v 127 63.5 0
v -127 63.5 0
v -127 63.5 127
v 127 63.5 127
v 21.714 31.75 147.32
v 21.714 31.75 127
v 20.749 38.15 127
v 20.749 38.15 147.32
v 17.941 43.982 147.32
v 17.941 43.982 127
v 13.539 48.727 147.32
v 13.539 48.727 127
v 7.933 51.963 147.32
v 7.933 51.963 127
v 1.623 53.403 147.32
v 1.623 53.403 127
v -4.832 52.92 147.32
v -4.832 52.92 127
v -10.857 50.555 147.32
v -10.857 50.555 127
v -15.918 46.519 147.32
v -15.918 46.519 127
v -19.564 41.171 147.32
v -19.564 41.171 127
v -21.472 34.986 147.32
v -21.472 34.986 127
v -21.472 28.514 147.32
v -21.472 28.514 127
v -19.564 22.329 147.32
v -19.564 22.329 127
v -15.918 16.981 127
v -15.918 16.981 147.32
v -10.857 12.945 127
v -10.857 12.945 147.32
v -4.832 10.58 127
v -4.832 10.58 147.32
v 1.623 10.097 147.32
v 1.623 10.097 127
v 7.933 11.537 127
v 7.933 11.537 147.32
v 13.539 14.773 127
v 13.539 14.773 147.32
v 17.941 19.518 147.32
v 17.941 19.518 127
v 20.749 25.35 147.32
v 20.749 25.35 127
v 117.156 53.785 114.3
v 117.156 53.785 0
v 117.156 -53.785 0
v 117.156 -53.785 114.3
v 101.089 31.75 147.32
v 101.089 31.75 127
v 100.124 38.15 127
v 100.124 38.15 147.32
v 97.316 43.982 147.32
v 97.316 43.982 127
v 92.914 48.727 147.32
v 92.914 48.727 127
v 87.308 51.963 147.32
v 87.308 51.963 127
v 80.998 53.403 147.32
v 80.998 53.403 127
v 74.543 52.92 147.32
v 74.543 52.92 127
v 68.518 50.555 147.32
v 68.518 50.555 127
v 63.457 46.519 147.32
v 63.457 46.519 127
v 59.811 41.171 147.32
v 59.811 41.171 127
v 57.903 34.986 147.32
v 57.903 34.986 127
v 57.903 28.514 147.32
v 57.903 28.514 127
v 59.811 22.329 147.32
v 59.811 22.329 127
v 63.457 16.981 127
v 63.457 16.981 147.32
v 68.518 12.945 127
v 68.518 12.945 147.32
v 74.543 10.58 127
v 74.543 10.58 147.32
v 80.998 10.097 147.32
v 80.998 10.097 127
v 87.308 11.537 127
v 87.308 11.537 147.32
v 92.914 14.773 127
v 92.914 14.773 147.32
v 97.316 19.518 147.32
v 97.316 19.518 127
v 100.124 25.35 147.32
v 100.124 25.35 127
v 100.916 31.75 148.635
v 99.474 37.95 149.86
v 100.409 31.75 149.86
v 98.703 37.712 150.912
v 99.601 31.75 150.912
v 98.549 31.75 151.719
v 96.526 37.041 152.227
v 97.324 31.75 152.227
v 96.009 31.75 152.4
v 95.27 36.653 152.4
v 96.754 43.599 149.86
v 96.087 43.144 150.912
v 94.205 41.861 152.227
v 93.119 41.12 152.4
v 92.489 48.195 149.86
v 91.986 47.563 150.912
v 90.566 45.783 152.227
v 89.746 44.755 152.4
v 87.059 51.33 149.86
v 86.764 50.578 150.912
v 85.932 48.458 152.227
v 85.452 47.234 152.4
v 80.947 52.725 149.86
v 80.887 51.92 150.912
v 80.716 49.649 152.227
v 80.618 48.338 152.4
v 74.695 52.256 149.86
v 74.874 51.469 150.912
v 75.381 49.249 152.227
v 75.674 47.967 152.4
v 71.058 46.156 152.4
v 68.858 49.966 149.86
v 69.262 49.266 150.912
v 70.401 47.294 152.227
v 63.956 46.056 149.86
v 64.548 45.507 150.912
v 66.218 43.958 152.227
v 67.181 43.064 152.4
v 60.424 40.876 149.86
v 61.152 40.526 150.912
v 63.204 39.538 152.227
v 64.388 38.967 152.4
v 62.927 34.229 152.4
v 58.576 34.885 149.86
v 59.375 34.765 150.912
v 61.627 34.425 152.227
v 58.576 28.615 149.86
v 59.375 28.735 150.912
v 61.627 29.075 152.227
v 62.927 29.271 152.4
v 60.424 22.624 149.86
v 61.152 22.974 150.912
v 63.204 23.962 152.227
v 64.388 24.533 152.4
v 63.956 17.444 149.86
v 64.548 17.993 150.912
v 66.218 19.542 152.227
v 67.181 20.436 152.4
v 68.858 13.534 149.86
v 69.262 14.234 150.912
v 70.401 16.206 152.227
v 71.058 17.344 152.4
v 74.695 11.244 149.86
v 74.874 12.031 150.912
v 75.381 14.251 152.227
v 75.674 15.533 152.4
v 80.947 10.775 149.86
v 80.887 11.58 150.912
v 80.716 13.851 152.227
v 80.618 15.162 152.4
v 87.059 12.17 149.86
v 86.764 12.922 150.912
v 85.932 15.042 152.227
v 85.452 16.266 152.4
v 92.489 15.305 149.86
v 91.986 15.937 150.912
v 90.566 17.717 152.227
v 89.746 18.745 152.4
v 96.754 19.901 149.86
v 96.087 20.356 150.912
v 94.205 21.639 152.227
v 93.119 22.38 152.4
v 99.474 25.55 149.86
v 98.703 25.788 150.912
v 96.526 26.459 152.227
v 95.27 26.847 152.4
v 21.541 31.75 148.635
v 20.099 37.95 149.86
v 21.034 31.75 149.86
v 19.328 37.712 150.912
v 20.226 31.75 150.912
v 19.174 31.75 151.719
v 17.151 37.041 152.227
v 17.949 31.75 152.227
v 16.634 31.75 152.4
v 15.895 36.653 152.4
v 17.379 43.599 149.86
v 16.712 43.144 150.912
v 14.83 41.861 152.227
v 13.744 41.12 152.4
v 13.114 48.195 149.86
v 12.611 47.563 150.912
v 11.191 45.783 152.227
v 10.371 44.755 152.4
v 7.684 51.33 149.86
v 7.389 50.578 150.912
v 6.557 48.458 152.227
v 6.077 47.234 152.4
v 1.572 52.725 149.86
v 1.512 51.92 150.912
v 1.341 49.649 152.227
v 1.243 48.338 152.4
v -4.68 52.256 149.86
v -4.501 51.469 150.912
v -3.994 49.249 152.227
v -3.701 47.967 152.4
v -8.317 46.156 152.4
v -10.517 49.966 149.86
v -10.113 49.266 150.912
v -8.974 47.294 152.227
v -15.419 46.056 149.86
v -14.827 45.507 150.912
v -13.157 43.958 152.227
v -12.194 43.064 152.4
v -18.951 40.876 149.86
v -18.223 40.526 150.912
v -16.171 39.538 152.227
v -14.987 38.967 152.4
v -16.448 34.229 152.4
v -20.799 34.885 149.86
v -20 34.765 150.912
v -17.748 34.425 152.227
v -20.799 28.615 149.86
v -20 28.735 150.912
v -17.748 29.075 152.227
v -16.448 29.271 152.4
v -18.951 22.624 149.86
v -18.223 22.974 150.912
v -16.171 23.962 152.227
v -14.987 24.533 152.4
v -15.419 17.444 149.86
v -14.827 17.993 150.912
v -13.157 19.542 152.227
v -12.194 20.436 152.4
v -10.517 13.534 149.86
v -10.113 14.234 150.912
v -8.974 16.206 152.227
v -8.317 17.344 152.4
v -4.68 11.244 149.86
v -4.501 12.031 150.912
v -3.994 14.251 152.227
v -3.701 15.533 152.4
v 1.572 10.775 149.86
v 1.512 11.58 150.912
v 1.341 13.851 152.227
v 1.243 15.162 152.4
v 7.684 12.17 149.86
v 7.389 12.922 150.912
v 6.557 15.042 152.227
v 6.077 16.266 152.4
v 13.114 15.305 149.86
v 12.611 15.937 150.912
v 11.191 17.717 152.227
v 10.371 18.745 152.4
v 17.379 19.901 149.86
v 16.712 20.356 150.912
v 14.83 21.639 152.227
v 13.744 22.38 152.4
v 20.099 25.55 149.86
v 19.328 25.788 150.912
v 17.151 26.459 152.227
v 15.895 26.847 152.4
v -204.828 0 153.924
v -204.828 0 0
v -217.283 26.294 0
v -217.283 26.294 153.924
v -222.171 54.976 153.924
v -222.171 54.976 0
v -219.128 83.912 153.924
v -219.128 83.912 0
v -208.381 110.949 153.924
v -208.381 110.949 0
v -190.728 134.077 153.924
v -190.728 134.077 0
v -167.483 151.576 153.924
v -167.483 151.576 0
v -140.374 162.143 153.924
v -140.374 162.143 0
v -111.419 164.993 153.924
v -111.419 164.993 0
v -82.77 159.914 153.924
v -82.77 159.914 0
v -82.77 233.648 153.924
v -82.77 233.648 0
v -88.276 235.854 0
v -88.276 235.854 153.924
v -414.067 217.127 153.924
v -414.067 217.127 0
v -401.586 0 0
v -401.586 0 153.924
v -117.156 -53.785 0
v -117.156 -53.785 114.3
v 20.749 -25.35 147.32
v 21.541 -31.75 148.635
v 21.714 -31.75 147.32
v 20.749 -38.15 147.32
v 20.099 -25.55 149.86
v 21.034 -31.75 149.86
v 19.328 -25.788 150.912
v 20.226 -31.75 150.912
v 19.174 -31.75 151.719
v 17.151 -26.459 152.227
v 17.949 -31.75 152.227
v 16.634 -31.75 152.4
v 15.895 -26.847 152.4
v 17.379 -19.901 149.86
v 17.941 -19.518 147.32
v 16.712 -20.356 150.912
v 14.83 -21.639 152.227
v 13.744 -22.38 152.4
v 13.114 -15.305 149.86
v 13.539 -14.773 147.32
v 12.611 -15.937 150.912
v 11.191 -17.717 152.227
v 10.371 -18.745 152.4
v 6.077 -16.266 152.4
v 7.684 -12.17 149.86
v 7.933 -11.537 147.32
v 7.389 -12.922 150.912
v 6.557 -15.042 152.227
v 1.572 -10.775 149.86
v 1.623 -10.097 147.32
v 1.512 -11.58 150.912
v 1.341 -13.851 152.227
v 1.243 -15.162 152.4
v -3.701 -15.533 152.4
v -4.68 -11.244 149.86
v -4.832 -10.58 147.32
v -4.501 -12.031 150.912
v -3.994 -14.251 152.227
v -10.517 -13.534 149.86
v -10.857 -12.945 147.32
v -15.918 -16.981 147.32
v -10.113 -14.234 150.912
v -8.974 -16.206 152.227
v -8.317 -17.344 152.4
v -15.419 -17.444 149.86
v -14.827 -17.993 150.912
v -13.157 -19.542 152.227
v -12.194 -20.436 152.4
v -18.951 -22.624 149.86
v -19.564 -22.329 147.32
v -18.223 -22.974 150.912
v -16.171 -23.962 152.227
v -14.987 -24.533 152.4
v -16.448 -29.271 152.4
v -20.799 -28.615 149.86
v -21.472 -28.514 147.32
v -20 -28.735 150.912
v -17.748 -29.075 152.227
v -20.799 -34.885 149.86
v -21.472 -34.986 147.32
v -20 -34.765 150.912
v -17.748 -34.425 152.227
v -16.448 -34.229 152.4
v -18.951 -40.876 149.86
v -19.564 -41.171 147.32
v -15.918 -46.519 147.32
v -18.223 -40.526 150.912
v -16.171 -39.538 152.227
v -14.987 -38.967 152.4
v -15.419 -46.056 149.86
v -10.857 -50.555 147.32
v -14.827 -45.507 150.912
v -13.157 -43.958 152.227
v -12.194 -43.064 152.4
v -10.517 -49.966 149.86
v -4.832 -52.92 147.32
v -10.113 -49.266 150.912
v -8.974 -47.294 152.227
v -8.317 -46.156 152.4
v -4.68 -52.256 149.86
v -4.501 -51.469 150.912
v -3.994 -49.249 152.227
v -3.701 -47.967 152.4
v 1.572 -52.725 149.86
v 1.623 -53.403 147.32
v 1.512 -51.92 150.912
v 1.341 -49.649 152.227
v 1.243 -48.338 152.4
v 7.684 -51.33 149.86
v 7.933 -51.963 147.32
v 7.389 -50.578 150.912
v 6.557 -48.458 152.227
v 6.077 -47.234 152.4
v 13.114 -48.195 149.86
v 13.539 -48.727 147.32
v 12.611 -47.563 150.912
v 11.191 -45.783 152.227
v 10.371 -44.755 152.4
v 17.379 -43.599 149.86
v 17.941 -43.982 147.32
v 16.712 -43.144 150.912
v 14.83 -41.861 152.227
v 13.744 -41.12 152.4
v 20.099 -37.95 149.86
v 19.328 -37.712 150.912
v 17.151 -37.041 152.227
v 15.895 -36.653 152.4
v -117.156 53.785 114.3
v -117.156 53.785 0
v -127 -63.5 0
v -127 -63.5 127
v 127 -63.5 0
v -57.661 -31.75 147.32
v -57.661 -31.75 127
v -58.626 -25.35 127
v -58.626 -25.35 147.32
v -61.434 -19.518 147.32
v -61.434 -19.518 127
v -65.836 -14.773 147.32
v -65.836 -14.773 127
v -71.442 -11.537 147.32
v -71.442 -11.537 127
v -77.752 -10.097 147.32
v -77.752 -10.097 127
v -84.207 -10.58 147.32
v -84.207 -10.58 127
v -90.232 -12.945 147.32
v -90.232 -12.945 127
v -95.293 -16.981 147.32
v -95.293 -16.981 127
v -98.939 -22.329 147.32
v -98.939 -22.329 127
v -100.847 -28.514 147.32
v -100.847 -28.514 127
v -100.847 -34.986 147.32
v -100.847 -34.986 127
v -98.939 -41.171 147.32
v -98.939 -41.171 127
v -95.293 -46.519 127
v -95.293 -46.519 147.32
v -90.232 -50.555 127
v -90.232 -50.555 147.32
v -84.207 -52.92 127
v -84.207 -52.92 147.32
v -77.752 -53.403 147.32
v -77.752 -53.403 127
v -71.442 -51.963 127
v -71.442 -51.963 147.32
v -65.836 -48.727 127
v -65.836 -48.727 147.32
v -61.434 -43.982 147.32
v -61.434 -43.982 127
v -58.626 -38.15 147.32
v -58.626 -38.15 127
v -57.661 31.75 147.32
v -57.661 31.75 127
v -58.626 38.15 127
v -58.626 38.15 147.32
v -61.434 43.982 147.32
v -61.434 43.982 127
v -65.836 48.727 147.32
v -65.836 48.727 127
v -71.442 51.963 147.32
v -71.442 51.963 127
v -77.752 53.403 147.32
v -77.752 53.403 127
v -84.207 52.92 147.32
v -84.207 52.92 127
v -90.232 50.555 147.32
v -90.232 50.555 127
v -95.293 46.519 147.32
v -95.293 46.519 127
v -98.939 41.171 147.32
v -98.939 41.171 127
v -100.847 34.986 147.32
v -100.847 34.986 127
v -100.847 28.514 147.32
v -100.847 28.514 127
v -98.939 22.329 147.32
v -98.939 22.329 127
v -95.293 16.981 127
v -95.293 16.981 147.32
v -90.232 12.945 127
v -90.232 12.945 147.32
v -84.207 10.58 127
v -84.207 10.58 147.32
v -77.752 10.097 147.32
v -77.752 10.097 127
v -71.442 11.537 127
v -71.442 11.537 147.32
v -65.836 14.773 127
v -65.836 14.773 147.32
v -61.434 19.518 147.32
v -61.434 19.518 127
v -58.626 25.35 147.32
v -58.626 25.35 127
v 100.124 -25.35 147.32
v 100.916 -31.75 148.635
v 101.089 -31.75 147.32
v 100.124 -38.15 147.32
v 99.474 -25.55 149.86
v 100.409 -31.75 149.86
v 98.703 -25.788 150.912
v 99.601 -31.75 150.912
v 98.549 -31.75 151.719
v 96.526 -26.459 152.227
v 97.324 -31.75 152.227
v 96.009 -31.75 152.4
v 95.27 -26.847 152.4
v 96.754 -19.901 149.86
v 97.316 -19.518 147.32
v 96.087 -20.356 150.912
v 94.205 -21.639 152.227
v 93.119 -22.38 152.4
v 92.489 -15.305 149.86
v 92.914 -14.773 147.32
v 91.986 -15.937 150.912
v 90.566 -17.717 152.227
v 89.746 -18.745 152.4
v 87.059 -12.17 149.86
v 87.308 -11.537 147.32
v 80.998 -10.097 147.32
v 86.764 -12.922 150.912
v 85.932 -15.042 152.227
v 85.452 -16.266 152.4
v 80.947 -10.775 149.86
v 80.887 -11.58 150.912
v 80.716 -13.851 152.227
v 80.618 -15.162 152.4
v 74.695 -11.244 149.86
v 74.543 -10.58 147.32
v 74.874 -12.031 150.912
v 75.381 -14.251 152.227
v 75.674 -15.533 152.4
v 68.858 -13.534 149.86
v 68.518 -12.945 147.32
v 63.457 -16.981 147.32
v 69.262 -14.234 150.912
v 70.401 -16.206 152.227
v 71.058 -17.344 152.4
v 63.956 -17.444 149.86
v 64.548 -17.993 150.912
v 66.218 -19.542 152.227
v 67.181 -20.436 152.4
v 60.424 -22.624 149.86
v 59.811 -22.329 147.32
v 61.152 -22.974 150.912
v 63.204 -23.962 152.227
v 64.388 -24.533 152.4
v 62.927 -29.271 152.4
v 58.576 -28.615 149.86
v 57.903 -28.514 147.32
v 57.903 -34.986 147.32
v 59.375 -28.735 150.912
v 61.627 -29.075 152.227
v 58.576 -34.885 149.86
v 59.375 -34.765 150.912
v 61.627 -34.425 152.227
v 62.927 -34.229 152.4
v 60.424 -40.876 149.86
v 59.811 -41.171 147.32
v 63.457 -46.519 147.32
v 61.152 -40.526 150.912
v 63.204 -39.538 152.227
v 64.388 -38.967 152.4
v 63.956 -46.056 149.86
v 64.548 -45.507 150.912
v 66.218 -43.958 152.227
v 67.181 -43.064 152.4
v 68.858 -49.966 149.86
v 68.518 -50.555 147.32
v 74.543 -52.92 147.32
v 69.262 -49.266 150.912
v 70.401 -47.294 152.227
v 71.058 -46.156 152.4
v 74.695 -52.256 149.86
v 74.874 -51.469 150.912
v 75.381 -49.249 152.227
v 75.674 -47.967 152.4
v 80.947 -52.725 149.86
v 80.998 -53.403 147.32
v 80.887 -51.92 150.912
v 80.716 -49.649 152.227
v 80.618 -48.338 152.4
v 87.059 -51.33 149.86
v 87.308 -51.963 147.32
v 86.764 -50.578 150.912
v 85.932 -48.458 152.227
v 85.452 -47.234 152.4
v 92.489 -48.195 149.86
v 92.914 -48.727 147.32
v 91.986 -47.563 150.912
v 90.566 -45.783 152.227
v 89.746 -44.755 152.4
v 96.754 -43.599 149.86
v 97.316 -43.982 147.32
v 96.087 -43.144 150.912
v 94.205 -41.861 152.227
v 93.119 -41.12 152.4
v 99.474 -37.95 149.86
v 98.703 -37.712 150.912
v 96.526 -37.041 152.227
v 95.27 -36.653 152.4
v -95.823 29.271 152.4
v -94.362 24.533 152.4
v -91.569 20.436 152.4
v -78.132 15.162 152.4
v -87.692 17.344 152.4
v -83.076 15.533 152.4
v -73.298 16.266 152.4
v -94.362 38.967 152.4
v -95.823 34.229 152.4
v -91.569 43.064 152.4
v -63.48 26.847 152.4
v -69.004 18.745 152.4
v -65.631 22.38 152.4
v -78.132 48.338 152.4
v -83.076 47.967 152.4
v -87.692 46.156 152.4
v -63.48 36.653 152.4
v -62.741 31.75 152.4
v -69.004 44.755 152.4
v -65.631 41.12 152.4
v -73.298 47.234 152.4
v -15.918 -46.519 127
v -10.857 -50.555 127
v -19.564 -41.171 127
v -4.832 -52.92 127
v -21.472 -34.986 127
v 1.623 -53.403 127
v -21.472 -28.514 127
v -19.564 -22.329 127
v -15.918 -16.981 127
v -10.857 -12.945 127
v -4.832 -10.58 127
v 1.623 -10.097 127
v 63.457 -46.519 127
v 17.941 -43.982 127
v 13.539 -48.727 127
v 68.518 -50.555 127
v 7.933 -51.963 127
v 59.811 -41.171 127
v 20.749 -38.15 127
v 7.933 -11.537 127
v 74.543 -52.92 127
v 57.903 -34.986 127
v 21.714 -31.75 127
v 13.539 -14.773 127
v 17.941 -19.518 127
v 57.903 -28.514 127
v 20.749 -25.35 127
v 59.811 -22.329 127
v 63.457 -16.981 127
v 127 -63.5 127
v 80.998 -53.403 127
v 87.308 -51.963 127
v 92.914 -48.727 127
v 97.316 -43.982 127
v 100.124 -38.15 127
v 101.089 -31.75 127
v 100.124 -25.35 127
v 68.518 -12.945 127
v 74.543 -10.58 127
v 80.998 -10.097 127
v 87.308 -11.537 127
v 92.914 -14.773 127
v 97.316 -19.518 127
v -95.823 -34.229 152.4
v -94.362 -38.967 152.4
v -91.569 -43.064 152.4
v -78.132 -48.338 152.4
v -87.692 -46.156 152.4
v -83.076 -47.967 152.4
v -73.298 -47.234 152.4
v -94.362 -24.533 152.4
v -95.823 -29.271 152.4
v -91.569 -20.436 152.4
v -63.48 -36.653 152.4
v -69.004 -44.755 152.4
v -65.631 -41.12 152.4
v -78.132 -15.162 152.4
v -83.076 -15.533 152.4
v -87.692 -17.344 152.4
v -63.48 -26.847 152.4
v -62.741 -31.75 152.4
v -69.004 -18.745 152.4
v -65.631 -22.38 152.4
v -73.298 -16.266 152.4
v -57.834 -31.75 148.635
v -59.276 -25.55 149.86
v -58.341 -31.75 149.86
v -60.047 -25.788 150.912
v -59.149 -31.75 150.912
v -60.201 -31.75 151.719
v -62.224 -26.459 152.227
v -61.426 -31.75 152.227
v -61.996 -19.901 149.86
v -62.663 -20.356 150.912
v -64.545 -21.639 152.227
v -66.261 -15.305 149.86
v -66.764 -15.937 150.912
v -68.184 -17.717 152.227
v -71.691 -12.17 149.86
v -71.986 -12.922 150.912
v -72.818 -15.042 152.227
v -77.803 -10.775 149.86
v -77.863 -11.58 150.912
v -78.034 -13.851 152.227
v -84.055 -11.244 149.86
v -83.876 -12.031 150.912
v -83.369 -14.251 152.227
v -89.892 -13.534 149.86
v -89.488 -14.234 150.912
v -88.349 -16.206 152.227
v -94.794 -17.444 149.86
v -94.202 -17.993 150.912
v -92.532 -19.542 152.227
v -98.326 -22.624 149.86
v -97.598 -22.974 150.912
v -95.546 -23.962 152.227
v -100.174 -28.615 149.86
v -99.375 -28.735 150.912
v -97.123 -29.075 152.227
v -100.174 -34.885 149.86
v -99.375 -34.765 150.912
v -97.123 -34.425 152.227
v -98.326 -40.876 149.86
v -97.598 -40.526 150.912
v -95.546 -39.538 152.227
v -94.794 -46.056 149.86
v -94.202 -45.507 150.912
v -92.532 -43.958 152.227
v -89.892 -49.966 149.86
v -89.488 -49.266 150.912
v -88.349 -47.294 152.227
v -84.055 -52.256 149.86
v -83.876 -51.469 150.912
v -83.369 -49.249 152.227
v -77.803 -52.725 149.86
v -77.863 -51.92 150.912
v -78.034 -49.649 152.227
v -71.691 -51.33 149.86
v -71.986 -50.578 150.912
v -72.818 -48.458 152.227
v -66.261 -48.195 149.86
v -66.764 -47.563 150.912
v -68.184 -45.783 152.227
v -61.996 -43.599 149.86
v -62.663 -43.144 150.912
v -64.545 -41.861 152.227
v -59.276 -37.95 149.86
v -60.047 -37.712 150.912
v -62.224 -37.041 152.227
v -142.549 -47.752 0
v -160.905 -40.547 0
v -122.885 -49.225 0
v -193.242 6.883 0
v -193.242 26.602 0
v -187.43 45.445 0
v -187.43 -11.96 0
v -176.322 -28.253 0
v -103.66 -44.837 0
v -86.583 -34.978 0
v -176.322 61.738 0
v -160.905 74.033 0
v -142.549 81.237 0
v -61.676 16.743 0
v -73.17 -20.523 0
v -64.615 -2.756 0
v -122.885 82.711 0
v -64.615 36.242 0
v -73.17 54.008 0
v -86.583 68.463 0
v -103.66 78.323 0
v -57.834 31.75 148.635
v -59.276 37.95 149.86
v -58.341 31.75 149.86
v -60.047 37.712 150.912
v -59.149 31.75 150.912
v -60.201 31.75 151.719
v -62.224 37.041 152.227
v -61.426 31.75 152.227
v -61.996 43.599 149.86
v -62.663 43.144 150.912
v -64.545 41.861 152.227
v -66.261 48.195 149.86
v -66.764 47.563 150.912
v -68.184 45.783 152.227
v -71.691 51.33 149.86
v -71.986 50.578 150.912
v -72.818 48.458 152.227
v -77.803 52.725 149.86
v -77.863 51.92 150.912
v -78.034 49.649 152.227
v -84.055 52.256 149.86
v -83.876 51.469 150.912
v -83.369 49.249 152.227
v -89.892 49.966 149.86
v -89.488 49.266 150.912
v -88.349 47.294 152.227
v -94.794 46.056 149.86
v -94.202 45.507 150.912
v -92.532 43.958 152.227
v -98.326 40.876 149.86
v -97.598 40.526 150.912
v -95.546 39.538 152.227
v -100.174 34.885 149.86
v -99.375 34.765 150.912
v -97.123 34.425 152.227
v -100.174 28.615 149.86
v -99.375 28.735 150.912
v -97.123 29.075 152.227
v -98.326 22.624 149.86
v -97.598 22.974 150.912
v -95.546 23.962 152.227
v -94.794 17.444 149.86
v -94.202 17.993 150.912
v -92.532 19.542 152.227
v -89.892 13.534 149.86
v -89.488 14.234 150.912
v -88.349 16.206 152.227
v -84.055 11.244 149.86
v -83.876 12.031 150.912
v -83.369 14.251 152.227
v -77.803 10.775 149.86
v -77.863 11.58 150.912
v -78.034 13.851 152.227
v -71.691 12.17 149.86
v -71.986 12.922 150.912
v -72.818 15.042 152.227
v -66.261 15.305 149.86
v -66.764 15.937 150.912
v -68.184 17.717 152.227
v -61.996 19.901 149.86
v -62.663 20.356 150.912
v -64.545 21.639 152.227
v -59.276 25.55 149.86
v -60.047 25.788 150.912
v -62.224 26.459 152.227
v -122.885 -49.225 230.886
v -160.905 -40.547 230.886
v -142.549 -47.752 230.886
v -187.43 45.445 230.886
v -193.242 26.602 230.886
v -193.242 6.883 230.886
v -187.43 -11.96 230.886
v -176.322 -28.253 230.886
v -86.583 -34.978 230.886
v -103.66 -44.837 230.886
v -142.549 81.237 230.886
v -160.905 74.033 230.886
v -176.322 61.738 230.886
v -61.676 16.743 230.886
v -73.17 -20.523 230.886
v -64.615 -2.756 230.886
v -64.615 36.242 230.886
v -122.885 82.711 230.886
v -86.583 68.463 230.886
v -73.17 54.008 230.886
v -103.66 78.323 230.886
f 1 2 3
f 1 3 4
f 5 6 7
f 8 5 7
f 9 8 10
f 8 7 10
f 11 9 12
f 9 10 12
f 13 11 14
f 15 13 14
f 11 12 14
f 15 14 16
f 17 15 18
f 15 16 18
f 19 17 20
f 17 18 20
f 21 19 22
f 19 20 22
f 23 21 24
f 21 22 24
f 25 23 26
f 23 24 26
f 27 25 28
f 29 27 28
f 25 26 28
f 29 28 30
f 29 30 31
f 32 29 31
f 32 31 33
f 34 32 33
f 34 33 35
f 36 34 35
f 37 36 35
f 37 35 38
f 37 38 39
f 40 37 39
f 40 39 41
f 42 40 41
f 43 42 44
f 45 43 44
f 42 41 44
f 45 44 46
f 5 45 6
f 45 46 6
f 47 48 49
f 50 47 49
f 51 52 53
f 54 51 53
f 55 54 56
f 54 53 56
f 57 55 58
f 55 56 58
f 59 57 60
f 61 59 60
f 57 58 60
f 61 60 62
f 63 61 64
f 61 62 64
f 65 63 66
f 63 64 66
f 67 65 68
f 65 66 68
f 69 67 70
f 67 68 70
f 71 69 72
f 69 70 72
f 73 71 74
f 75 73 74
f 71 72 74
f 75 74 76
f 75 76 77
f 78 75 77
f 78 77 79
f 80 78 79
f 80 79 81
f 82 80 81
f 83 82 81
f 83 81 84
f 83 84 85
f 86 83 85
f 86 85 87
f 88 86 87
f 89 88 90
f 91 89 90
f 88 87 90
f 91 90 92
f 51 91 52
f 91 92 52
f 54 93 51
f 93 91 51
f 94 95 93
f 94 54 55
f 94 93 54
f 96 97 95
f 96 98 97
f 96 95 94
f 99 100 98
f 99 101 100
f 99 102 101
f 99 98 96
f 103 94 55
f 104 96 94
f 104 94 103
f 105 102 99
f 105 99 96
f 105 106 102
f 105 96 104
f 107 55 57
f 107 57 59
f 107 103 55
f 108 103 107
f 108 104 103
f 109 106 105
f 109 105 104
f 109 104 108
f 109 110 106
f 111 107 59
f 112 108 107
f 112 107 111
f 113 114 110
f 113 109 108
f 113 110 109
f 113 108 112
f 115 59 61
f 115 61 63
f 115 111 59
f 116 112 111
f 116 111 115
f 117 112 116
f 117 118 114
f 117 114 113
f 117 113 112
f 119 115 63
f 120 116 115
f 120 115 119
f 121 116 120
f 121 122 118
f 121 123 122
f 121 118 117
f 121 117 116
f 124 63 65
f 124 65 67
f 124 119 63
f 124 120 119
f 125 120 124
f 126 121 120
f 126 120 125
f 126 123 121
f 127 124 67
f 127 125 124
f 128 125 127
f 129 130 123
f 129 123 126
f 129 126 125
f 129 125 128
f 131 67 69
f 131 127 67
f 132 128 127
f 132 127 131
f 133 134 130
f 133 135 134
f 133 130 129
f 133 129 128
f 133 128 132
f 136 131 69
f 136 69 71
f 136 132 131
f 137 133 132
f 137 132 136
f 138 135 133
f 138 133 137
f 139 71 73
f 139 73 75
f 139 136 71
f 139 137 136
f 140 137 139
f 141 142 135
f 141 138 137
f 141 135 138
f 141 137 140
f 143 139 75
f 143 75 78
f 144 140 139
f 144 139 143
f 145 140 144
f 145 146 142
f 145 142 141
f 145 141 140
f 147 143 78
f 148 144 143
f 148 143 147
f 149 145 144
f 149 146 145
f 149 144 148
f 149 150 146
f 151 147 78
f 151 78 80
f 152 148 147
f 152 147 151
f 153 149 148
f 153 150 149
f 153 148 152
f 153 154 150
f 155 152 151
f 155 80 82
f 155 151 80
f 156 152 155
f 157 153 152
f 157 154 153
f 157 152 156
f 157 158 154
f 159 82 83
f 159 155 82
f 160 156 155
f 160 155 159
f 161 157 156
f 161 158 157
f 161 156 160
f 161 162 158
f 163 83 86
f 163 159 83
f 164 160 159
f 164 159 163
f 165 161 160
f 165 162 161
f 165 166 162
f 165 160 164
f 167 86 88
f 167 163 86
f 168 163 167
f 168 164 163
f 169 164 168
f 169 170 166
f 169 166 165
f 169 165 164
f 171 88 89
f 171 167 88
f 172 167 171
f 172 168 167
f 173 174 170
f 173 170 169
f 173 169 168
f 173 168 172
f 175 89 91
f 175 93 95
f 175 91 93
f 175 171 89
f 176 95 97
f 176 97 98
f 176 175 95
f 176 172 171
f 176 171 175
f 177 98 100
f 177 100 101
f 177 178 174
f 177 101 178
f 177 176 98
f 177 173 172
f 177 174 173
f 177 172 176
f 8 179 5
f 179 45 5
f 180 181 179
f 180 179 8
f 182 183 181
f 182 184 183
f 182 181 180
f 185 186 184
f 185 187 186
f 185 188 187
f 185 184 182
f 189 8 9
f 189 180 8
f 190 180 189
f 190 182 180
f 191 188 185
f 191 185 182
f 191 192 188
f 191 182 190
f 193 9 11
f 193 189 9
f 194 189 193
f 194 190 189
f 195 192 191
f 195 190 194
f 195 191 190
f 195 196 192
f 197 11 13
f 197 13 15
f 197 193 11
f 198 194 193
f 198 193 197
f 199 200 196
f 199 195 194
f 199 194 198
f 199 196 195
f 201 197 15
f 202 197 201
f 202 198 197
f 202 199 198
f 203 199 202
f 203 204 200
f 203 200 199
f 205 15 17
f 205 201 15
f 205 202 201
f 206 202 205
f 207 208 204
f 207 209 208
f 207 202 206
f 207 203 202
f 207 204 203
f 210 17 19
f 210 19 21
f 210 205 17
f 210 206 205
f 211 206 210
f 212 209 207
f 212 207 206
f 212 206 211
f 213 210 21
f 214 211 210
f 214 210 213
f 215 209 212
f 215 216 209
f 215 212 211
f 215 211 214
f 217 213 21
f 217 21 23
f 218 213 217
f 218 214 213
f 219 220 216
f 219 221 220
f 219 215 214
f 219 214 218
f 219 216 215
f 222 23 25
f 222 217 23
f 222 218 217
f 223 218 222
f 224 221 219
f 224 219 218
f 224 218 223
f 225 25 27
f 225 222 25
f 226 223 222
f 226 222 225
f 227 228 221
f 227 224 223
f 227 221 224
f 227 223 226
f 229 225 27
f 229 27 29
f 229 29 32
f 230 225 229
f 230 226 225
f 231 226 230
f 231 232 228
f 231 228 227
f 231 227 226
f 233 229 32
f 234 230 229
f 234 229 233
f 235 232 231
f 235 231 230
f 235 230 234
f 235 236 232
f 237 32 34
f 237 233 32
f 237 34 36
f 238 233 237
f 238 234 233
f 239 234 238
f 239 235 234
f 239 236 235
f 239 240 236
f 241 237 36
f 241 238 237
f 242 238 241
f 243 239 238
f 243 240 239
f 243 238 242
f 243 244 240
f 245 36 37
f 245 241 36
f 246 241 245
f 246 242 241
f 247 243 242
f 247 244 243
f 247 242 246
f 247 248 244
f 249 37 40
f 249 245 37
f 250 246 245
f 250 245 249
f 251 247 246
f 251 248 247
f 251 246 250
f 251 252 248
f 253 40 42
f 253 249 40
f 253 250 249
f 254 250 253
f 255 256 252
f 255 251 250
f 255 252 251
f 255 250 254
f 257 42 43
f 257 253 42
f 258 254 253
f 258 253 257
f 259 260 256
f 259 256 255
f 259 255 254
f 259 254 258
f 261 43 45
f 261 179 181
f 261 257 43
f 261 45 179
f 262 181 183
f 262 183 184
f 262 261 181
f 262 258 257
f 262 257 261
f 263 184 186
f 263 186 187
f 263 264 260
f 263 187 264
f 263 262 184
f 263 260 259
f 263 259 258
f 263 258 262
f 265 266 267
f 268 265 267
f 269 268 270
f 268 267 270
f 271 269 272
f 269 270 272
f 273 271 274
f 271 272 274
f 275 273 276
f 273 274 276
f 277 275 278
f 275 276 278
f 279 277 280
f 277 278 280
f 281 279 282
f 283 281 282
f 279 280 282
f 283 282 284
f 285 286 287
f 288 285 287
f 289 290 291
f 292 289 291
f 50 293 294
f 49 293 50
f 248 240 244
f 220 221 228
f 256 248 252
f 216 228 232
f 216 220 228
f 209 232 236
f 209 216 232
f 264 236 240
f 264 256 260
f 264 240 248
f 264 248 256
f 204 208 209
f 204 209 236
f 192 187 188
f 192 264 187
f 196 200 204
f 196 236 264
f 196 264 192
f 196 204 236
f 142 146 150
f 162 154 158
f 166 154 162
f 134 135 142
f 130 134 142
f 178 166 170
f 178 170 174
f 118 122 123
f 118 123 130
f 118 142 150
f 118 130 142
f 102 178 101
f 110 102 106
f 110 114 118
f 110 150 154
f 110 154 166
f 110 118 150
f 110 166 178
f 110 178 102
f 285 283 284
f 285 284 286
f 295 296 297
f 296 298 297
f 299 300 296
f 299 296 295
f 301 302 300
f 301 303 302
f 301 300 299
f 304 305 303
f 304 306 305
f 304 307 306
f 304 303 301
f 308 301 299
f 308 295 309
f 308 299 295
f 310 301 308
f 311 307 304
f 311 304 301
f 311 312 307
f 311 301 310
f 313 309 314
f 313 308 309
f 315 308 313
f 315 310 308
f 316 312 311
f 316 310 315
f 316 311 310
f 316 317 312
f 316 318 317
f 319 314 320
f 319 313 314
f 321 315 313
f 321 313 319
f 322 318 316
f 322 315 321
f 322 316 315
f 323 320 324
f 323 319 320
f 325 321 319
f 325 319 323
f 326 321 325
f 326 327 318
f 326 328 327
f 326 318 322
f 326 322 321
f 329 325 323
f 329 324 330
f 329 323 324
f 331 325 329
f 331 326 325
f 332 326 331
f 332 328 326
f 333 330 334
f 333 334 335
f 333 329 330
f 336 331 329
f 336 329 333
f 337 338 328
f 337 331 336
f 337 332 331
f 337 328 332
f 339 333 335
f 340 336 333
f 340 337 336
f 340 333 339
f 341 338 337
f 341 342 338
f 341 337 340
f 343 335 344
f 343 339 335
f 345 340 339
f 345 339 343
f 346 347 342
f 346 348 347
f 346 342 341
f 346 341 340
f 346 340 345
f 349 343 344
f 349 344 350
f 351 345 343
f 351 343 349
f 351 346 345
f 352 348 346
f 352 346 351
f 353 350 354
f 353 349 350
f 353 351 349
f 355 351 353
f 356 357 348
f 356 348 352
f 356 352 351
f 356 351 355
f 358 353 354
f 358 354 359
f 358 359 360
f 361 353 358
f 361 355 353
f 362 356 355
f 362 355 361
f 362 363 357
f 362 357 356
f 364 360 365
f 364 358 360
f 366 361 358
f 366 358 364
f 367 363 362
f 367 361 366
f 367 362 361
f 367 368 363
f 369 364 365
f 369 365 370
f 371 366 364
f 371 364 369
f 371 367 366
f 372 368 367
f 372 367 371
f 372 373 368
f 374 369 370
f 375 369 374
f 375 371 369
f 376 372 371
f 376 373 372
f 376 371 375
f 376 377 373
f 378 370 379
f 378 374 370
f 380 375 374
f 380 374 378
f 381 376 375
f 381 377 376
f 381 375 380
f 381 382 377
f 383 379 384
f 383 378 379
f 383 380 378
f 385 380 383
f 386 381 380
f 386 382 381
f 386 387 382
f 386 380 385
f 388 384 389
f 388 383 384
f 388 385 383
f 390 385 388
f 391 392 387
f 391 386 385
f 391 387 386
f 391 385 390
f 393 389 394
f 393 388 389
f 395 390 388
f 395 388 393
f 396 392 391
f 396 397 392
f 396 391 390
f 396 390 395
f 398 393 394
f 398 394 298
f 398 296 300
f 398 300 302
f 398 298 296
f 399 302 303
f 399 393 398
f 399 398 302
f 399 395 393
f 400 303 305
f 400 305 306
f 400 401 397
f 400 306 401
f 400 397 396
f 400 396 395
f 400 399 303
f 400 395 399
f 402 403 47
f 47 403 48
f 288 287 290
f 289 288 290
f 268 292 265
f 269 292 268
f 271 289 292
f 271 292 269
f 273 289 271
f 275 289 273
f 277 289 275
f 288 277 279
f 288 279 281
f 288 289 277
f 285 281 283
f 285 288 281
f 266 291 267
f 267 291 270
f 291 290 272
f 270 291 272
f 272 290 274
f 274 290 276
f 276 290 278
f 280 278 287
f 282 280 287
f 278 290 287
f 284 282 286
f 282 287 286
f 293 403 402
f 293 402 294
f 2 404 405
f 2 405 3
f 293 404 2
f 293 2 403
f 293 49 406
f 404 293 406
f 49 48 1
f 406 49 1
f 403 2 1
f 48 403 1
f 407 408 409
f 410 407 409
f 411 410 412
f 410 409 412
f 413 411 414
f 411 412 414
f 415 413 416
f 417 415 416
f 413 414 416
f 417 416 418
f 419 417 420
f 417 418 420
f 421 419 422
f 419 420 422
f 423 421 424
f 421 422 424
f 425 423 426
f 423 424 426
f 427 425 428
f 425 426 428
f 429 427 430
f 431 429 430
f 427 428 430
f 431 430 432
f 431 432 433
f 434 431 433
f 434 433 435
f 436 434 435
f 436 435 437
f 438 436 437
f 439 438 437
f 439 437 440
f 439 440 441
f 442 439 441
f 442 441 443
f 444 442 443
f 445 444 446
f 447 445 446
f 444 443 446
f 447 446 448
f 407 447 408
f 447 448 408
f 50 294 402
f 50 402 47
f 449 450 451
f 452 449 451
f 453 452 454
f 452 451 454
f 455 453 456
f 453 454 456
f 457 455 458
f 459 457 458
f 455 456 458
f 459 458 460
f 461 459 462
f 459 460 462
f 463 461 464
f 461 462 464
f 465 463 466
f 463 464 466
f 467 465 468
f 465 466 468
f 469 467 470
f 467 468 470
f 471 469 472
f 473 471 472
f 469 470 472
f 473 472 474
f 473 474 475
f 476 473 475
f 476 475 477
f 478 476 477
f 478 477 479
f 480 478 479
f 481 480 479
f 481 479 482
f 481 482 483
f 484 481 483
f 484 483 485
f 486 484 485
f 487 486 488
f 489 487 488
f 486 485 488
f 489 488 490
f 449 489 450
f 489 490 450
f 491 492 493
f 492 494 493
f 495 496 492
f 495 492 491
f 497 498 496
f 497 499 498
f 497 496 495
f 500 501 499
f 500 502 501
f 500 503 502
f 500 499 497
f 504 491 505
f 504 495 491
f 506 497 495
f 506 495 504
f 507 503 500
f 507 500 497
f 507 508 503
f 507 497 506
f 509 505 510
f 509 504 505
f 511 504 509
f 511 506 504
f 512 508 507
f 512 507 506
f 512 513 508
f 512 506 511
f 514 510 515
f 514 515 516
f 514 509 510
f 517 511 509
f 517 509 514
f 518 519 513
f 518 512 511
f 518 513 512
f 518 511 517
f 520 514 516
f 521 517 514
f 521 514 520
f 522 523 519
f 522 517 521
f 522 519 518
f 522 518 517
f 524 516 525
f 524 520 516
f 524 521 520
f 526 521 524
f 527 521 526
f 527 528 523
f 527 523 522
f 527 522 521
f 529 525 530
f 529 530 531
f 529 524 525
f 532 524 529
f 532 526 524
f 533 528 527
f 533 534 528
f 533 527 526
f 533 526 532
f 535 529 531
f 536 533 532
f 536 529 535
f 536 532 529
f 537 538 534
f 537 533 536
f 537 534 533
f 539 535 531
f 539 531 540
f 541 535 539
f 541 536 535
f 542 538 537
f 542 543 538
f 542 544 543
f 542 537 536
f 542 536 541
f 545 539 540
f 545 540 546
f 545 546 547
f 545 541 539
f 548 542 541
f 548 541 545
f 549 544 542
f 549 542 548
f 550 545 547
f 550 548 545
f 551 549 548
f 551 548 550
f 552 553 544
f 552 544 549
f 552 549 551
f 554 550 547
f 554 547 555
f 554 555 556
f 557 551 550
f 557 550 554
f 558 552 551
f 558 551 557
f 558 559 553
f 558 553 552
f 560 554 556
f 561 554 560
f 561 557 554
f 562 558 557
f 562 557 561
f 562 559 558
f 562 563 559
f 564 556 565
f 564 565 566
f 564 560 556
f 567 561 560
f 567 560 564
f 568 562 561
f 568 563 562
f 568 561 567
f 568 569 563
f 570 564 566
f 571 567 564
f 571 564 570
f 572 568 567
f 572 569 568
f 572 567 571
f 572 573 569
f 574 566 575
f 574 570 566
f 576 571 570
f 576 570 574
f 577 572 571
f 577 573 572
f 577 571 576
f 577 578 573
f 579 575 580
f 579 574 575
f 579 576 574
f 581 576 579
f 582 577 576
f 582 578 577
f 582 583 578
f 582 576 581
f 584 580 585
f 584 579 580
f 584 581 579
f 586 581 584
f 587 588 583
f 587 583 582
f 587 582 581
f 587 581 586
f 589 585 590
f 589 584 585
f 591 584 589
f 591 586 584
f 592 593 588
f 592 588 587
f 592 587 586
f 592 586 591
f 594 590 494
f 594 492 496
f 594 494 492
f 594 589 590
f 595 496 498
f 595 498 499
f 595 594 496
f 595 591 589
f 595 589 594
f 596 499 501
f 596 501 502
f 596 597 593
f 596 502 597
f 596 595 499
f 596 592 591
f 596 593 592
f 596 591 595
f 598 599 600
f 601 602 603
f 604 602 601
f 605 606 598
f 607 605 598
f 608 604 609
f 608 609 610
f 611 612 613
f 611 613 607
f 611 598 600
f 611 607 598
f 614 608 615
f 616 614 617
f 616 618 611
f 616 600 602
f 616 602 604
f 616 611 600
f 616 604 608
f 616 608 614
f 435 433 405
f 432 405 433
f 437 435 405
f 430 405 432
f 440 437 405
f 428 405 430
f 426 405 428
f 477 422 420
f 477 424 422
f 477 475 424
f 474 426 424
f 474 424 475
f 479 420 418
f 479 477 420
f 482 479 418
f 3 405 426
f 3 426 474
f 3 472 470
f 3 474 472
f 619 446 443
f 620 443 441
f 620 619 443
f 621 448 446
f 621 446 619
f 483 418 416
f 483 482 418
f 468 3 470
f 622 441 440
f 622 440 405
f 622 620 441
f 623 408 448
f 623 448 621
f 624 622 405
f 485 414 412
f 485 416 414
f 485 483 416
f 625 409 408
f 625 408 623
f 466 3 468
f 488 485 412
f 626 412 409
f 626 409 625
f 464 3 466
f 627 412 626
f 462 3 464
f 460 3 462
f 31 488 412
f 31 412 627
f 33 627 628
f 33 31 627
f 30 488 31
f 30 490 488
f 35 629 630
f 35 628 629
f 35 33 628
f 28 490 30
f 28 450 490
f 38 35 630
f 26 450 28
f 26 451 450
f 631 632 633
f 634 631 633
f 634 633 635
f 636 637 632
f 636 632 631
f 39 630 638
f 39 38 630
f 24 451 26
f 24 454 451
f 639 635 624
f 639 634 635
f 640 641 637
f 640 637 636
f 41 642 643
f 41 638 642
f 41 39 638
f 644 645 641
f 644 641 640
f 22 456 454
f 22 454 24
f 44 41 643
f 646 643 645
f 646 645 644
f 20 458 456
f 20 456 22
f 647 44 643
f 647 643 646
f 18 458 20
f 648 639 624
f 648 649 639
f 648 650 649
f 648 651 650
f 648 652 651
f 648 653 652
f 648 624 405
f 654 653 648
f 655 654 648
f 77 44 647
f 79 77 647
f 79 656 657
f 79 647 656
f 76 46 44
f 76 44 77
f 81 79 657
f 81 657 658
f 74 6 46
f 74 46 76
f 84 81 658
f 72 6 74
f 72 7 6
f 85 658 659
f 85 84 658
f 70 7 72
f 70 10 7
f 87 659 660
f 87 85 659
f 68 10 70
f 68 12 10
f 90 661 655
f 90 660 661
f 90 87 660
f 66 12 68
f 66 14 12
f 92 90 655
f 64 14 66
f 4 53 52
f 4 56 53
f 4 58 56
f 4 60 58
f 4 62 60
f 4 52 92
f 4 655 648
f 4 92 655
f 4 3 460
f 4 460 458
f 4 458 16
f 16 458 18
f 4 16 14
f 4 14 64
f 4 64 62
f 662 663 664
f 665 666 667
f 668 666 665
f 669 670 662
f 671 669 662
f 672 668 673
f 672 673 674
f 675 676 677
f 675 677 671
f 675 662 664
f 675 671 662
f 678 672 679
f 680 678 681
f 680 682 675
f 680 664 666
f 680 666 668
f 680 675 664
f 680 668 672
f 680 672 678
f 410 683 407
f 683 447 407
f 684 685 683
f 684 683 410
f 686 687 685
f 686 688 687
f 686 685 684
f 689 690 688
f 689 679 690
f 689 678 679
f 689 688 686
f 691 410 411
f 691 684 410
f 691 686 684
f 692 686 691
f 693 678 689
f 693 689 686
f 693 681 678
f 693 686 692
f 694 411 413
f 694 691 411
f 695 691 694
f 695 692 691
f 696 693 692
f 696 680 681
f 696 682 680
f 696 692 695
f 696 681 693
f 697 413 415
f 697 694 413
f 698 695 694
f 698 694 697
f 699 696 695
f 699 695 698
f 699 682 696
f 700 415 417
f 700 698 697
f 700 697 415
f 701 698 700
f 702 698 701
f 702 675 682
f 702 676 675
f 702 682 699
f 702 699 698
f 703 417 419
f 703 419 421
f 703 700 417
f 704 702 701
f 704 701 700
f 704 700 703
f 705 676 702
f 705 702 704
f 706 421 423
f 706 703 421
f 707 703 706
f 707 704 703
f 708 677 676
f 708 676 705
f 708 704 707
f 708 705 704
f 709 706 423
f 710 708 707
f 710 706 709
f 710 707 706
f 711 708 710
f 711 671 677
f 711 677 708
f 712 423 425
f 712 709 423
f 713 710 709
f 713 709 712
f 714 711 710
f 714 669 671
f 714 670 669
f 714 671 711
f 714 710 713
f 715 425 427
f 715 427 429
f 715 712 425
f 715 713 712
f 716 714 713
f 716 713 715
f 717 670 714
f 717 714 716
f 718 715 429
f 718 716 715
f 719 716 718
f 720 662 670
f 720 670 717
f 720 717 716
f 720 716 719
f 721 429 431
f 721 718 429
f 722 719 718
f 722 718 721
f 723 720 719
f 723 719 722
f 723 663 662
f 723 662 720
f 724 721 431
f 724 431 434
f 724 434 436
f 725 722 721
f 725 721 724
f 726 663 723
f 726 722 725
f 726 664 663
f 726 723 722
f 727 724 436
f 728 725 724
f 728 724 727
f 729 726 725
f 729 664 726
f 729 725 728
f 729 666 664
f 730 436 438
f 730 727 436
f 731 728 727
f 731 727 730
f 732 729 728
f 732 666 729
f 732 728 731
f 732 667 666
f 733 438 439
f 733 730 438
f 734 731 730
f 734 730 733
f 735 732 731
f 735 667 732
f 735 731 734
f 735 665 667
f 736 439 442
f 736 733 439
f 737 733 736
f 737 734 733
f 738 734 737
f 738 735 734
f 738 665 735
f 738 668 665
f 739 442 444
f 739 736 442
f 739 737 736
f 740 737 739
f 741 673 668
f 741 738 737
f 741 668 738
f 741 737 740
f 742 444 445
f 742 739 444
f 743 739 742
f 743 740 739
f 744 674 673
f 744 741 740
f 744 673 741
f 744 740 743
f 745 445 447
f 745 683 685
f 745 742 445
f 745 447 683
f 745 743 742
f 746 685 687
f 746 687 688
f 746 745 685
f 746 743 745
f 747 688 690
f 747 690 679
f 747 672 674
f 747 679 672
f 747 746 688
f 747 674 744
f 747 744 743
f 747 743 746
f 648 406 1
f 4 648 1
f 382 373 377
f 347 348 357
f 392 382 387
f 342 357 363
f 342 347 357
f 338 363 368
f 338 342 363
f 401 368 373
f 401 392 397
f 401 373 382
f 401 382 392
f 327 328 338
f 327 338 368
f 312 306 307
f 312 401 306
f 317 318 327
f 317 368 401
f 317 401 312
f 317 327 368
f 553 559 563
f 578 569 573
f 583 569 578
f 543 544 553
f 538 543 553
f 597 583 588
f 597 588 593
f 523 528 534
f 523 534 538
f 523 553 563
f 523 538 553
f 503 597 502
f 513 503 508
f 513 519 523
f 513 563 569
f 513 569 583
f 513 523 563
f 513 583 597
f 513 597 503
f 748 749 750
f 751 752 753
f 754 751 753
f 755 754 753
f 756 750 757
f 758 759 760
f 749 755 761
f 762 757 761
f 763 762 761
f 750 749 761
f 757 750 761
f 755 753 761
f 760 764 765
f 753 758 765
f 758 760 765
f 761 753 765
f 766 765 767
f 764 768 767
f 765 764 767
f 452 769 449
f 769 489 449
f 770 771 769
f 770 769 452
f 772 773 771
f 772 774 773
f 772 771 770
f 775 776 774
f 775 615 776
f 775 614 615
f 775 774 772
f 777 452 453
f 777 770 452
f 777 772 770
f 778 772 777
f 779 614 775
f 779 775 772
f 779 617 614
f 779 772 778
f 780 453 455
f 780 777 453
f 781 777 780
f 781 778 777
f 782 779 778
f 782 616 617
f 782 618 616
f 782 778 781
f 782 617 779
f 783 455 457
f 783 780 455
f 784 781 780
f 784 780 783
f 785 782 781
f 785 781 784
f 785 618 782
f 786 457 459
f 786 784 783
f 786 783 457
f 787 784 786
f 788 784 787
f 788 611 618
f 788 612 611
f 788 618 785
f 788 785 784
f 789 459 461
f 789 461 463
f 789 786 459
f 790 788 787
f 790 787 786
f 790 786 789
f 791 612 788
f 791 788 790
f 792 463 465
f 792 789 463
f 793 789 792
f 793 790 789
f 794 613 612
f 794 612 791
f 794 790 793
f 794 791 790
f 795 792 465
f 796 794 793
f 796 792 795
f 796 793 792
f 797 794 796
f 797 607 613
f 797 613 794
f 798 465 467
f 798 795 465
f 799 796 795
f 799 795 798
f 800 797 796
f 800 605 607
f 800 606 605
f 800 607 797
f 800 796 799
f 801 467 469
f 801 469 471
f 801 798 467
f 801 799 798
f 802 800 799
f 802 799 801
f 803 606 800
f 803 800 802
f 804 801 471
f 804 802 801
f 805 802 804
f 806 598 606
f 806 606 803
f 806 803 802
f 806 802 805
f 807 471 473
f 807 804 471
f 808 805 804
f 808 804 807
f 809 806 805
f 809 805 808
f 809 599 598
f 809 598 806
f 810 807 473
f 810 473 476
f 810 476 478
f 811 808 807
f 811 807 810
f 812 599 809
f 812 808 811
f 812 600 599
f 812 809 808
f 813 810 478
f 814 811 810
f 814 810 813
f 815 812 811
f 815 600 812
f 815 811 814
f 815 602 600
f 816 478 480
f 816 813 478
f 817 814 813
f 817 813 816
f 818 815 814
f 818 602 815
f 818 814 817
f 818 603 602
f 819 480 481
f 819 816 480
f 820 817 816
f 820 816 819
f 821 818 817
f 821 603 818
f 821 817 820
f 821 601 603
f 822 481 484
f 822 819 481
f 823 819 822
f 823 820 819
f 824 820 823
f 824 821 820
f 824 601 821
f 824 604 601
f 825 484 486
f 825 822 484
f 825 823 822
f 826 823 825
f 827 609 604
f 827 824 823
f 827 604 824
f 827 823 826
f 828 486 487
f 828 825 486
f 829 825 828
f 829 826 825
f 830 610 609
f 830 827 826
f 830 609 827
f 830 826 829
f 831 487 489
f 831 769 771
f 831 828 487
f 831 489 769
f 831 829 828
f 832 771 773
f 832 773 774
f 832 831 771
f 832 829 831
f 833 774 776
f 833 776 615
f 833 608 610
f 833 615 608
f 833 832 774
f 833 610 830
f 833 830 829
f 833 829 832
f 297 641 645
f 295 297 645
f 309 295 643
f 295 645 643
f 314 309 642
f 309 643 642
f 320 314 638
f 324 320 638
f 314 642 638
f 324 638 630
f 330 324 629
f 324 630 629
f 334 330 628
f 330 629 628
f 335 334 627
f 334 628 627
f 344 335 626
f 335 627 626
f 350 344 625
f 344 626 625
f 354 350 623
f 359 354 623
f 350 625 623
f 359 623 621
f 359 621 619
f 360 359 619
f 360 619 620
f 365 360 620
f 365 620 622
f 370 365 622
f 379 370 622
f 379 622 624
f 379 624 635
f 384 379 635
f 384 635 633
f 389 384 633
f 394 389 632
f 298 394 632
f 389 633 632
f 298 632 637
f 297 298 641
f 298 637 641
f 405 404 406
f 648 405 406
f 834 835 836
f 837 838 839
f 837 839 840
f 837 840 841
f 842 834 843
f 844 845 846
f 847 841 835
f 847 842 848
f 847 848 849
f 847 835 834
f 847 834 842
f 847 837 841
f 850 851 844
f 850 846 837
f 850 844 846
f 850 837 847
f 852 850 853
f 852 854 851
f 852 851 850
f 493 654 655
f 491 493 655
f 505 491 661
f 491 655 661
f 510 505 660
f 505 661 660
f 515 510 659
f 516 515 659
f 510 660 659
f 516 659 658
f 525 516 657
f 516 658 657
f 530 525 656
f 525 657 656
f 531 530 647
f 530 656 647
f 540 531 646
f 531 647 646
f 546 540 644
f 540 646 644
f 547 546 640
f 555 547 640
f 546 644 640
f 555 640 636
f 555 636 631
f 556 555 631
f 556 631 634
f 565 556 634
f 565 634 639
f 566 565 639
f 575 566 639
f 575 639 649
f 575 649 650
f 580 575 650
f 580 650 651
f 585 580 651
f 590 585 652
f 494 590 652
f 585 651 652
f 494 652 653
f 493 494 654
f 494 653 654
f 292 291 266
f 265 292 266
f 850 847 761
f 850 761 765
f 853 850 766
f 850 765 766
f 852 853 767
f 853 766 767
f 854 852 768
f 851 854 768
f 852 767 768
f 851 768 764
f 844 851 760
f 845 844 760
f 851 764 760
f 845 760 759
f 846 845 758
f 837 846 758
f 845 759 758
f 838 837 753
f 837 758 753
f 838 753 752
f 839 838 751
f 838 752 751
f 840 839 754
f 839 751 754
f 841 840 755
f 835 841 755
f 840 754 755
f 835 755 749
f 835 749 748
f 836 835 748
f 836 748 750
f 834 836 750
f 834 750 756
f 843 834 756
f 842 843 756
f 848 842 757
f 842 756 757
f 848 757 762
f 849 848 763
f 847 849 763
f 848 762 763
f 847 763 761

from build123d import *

# Parameters (mm, degrees)
F0_W      = 254
F0_H      = 127
F1_DEPTH  = 127
F2_R      = 21.714111
F3_DEPTH  = 25.4
F4_W      = 234.311492
F4_H      = 107.570172
F5_DEPTH  = 114.3
F6_R      = 5.08
F8_DEPTH  = 153.924
F9_R      = 66.152847
F10_DEPTH = 230.886


with BuildPart() as f1:
    # F0 (on Top) → F1 (new body)
    with BuildSketch(Plane.XY):
        Rectangle(F0_W, F0_H)
    extrude(amount=F1_DEPTH)

    # F2 (on face) → F3 (join)
    with BuildSketch(Plane.XY.offset(127)):
        with Locations((-79.375, 31.75)):
            Circle(F2_R)
        with Locations((0, 31.75)):
            Circle(F2_R)
        with Locations((79.375, 31.75)):
            Circle(F2_R)
        with Locations((79.375, -31.75)):
            Circle(F2_R)
        with Locations((0, -31.75)):
            Circle(F2_R)
        with Locations((-79.375, -31.75)):
            Circle(F2_R)
    extrude(amount=F3_DEPTH)

    # F4 (on face) → F5 (cut)
    with BuildSketch(Plane(origin=(0, 0, 0), x_dir=(1, 0, 0), z_dir=(0, 0, -1))):
        Rectangle(F4_W, F4_H)
    extrude(amount=-F5_DEPTH, mode=Mode.SUBTRACT)

    # F6
    f6_edges = [f1.edges().sort_by_distance(p)[0] for p in [
        (57.660889, 31.75, 152.4),
        (-21.714111, 31.75, 152.4),
        (-101.089111, 31.75, 152.4),
        (-101.089111, -31.75, 152.4),
        (-21.714111, -31.75, 152.4),
        (57.660889, -31.75, 152.4),
    ]]
    fillet(f6_edges, radius=F6_R)


with BuildPart() as f8:
    # F7 (on Top) → F8 (new body)
    with BuildSketch(Plane.XY):
        with BuildLine():
            Line((-401.586056, 0), (-204.827577, 0))
            ThreePointArc((-204.827577, 0), (-200.346246, 123.11768), (-82.770452, 159.914121))
            Line((-82.770452, 159.914121), (-82.770452, 233.648032))
            Line((-82.770452, 233.648032), (-88.275902, 235.853811))
            Line((-88.275902, 235.853811), (-414.06701, 217.126559))
            Line((-414.06701, 217.126559), (-401.586056, 0))
        make_face()
    extrude(amount=F8_DEPTH)


with BuildPart() as f10:
    # F9 (on Top) → F10 (new body)
    with BuildSketch(Plane.XY):
        with Locations((-127.828509, 16.742676)):
            Circle(F9_R)
    extrude(amount=F10_DEPTH)


solid = Compound([f1.part, f8.part, f10.part])
